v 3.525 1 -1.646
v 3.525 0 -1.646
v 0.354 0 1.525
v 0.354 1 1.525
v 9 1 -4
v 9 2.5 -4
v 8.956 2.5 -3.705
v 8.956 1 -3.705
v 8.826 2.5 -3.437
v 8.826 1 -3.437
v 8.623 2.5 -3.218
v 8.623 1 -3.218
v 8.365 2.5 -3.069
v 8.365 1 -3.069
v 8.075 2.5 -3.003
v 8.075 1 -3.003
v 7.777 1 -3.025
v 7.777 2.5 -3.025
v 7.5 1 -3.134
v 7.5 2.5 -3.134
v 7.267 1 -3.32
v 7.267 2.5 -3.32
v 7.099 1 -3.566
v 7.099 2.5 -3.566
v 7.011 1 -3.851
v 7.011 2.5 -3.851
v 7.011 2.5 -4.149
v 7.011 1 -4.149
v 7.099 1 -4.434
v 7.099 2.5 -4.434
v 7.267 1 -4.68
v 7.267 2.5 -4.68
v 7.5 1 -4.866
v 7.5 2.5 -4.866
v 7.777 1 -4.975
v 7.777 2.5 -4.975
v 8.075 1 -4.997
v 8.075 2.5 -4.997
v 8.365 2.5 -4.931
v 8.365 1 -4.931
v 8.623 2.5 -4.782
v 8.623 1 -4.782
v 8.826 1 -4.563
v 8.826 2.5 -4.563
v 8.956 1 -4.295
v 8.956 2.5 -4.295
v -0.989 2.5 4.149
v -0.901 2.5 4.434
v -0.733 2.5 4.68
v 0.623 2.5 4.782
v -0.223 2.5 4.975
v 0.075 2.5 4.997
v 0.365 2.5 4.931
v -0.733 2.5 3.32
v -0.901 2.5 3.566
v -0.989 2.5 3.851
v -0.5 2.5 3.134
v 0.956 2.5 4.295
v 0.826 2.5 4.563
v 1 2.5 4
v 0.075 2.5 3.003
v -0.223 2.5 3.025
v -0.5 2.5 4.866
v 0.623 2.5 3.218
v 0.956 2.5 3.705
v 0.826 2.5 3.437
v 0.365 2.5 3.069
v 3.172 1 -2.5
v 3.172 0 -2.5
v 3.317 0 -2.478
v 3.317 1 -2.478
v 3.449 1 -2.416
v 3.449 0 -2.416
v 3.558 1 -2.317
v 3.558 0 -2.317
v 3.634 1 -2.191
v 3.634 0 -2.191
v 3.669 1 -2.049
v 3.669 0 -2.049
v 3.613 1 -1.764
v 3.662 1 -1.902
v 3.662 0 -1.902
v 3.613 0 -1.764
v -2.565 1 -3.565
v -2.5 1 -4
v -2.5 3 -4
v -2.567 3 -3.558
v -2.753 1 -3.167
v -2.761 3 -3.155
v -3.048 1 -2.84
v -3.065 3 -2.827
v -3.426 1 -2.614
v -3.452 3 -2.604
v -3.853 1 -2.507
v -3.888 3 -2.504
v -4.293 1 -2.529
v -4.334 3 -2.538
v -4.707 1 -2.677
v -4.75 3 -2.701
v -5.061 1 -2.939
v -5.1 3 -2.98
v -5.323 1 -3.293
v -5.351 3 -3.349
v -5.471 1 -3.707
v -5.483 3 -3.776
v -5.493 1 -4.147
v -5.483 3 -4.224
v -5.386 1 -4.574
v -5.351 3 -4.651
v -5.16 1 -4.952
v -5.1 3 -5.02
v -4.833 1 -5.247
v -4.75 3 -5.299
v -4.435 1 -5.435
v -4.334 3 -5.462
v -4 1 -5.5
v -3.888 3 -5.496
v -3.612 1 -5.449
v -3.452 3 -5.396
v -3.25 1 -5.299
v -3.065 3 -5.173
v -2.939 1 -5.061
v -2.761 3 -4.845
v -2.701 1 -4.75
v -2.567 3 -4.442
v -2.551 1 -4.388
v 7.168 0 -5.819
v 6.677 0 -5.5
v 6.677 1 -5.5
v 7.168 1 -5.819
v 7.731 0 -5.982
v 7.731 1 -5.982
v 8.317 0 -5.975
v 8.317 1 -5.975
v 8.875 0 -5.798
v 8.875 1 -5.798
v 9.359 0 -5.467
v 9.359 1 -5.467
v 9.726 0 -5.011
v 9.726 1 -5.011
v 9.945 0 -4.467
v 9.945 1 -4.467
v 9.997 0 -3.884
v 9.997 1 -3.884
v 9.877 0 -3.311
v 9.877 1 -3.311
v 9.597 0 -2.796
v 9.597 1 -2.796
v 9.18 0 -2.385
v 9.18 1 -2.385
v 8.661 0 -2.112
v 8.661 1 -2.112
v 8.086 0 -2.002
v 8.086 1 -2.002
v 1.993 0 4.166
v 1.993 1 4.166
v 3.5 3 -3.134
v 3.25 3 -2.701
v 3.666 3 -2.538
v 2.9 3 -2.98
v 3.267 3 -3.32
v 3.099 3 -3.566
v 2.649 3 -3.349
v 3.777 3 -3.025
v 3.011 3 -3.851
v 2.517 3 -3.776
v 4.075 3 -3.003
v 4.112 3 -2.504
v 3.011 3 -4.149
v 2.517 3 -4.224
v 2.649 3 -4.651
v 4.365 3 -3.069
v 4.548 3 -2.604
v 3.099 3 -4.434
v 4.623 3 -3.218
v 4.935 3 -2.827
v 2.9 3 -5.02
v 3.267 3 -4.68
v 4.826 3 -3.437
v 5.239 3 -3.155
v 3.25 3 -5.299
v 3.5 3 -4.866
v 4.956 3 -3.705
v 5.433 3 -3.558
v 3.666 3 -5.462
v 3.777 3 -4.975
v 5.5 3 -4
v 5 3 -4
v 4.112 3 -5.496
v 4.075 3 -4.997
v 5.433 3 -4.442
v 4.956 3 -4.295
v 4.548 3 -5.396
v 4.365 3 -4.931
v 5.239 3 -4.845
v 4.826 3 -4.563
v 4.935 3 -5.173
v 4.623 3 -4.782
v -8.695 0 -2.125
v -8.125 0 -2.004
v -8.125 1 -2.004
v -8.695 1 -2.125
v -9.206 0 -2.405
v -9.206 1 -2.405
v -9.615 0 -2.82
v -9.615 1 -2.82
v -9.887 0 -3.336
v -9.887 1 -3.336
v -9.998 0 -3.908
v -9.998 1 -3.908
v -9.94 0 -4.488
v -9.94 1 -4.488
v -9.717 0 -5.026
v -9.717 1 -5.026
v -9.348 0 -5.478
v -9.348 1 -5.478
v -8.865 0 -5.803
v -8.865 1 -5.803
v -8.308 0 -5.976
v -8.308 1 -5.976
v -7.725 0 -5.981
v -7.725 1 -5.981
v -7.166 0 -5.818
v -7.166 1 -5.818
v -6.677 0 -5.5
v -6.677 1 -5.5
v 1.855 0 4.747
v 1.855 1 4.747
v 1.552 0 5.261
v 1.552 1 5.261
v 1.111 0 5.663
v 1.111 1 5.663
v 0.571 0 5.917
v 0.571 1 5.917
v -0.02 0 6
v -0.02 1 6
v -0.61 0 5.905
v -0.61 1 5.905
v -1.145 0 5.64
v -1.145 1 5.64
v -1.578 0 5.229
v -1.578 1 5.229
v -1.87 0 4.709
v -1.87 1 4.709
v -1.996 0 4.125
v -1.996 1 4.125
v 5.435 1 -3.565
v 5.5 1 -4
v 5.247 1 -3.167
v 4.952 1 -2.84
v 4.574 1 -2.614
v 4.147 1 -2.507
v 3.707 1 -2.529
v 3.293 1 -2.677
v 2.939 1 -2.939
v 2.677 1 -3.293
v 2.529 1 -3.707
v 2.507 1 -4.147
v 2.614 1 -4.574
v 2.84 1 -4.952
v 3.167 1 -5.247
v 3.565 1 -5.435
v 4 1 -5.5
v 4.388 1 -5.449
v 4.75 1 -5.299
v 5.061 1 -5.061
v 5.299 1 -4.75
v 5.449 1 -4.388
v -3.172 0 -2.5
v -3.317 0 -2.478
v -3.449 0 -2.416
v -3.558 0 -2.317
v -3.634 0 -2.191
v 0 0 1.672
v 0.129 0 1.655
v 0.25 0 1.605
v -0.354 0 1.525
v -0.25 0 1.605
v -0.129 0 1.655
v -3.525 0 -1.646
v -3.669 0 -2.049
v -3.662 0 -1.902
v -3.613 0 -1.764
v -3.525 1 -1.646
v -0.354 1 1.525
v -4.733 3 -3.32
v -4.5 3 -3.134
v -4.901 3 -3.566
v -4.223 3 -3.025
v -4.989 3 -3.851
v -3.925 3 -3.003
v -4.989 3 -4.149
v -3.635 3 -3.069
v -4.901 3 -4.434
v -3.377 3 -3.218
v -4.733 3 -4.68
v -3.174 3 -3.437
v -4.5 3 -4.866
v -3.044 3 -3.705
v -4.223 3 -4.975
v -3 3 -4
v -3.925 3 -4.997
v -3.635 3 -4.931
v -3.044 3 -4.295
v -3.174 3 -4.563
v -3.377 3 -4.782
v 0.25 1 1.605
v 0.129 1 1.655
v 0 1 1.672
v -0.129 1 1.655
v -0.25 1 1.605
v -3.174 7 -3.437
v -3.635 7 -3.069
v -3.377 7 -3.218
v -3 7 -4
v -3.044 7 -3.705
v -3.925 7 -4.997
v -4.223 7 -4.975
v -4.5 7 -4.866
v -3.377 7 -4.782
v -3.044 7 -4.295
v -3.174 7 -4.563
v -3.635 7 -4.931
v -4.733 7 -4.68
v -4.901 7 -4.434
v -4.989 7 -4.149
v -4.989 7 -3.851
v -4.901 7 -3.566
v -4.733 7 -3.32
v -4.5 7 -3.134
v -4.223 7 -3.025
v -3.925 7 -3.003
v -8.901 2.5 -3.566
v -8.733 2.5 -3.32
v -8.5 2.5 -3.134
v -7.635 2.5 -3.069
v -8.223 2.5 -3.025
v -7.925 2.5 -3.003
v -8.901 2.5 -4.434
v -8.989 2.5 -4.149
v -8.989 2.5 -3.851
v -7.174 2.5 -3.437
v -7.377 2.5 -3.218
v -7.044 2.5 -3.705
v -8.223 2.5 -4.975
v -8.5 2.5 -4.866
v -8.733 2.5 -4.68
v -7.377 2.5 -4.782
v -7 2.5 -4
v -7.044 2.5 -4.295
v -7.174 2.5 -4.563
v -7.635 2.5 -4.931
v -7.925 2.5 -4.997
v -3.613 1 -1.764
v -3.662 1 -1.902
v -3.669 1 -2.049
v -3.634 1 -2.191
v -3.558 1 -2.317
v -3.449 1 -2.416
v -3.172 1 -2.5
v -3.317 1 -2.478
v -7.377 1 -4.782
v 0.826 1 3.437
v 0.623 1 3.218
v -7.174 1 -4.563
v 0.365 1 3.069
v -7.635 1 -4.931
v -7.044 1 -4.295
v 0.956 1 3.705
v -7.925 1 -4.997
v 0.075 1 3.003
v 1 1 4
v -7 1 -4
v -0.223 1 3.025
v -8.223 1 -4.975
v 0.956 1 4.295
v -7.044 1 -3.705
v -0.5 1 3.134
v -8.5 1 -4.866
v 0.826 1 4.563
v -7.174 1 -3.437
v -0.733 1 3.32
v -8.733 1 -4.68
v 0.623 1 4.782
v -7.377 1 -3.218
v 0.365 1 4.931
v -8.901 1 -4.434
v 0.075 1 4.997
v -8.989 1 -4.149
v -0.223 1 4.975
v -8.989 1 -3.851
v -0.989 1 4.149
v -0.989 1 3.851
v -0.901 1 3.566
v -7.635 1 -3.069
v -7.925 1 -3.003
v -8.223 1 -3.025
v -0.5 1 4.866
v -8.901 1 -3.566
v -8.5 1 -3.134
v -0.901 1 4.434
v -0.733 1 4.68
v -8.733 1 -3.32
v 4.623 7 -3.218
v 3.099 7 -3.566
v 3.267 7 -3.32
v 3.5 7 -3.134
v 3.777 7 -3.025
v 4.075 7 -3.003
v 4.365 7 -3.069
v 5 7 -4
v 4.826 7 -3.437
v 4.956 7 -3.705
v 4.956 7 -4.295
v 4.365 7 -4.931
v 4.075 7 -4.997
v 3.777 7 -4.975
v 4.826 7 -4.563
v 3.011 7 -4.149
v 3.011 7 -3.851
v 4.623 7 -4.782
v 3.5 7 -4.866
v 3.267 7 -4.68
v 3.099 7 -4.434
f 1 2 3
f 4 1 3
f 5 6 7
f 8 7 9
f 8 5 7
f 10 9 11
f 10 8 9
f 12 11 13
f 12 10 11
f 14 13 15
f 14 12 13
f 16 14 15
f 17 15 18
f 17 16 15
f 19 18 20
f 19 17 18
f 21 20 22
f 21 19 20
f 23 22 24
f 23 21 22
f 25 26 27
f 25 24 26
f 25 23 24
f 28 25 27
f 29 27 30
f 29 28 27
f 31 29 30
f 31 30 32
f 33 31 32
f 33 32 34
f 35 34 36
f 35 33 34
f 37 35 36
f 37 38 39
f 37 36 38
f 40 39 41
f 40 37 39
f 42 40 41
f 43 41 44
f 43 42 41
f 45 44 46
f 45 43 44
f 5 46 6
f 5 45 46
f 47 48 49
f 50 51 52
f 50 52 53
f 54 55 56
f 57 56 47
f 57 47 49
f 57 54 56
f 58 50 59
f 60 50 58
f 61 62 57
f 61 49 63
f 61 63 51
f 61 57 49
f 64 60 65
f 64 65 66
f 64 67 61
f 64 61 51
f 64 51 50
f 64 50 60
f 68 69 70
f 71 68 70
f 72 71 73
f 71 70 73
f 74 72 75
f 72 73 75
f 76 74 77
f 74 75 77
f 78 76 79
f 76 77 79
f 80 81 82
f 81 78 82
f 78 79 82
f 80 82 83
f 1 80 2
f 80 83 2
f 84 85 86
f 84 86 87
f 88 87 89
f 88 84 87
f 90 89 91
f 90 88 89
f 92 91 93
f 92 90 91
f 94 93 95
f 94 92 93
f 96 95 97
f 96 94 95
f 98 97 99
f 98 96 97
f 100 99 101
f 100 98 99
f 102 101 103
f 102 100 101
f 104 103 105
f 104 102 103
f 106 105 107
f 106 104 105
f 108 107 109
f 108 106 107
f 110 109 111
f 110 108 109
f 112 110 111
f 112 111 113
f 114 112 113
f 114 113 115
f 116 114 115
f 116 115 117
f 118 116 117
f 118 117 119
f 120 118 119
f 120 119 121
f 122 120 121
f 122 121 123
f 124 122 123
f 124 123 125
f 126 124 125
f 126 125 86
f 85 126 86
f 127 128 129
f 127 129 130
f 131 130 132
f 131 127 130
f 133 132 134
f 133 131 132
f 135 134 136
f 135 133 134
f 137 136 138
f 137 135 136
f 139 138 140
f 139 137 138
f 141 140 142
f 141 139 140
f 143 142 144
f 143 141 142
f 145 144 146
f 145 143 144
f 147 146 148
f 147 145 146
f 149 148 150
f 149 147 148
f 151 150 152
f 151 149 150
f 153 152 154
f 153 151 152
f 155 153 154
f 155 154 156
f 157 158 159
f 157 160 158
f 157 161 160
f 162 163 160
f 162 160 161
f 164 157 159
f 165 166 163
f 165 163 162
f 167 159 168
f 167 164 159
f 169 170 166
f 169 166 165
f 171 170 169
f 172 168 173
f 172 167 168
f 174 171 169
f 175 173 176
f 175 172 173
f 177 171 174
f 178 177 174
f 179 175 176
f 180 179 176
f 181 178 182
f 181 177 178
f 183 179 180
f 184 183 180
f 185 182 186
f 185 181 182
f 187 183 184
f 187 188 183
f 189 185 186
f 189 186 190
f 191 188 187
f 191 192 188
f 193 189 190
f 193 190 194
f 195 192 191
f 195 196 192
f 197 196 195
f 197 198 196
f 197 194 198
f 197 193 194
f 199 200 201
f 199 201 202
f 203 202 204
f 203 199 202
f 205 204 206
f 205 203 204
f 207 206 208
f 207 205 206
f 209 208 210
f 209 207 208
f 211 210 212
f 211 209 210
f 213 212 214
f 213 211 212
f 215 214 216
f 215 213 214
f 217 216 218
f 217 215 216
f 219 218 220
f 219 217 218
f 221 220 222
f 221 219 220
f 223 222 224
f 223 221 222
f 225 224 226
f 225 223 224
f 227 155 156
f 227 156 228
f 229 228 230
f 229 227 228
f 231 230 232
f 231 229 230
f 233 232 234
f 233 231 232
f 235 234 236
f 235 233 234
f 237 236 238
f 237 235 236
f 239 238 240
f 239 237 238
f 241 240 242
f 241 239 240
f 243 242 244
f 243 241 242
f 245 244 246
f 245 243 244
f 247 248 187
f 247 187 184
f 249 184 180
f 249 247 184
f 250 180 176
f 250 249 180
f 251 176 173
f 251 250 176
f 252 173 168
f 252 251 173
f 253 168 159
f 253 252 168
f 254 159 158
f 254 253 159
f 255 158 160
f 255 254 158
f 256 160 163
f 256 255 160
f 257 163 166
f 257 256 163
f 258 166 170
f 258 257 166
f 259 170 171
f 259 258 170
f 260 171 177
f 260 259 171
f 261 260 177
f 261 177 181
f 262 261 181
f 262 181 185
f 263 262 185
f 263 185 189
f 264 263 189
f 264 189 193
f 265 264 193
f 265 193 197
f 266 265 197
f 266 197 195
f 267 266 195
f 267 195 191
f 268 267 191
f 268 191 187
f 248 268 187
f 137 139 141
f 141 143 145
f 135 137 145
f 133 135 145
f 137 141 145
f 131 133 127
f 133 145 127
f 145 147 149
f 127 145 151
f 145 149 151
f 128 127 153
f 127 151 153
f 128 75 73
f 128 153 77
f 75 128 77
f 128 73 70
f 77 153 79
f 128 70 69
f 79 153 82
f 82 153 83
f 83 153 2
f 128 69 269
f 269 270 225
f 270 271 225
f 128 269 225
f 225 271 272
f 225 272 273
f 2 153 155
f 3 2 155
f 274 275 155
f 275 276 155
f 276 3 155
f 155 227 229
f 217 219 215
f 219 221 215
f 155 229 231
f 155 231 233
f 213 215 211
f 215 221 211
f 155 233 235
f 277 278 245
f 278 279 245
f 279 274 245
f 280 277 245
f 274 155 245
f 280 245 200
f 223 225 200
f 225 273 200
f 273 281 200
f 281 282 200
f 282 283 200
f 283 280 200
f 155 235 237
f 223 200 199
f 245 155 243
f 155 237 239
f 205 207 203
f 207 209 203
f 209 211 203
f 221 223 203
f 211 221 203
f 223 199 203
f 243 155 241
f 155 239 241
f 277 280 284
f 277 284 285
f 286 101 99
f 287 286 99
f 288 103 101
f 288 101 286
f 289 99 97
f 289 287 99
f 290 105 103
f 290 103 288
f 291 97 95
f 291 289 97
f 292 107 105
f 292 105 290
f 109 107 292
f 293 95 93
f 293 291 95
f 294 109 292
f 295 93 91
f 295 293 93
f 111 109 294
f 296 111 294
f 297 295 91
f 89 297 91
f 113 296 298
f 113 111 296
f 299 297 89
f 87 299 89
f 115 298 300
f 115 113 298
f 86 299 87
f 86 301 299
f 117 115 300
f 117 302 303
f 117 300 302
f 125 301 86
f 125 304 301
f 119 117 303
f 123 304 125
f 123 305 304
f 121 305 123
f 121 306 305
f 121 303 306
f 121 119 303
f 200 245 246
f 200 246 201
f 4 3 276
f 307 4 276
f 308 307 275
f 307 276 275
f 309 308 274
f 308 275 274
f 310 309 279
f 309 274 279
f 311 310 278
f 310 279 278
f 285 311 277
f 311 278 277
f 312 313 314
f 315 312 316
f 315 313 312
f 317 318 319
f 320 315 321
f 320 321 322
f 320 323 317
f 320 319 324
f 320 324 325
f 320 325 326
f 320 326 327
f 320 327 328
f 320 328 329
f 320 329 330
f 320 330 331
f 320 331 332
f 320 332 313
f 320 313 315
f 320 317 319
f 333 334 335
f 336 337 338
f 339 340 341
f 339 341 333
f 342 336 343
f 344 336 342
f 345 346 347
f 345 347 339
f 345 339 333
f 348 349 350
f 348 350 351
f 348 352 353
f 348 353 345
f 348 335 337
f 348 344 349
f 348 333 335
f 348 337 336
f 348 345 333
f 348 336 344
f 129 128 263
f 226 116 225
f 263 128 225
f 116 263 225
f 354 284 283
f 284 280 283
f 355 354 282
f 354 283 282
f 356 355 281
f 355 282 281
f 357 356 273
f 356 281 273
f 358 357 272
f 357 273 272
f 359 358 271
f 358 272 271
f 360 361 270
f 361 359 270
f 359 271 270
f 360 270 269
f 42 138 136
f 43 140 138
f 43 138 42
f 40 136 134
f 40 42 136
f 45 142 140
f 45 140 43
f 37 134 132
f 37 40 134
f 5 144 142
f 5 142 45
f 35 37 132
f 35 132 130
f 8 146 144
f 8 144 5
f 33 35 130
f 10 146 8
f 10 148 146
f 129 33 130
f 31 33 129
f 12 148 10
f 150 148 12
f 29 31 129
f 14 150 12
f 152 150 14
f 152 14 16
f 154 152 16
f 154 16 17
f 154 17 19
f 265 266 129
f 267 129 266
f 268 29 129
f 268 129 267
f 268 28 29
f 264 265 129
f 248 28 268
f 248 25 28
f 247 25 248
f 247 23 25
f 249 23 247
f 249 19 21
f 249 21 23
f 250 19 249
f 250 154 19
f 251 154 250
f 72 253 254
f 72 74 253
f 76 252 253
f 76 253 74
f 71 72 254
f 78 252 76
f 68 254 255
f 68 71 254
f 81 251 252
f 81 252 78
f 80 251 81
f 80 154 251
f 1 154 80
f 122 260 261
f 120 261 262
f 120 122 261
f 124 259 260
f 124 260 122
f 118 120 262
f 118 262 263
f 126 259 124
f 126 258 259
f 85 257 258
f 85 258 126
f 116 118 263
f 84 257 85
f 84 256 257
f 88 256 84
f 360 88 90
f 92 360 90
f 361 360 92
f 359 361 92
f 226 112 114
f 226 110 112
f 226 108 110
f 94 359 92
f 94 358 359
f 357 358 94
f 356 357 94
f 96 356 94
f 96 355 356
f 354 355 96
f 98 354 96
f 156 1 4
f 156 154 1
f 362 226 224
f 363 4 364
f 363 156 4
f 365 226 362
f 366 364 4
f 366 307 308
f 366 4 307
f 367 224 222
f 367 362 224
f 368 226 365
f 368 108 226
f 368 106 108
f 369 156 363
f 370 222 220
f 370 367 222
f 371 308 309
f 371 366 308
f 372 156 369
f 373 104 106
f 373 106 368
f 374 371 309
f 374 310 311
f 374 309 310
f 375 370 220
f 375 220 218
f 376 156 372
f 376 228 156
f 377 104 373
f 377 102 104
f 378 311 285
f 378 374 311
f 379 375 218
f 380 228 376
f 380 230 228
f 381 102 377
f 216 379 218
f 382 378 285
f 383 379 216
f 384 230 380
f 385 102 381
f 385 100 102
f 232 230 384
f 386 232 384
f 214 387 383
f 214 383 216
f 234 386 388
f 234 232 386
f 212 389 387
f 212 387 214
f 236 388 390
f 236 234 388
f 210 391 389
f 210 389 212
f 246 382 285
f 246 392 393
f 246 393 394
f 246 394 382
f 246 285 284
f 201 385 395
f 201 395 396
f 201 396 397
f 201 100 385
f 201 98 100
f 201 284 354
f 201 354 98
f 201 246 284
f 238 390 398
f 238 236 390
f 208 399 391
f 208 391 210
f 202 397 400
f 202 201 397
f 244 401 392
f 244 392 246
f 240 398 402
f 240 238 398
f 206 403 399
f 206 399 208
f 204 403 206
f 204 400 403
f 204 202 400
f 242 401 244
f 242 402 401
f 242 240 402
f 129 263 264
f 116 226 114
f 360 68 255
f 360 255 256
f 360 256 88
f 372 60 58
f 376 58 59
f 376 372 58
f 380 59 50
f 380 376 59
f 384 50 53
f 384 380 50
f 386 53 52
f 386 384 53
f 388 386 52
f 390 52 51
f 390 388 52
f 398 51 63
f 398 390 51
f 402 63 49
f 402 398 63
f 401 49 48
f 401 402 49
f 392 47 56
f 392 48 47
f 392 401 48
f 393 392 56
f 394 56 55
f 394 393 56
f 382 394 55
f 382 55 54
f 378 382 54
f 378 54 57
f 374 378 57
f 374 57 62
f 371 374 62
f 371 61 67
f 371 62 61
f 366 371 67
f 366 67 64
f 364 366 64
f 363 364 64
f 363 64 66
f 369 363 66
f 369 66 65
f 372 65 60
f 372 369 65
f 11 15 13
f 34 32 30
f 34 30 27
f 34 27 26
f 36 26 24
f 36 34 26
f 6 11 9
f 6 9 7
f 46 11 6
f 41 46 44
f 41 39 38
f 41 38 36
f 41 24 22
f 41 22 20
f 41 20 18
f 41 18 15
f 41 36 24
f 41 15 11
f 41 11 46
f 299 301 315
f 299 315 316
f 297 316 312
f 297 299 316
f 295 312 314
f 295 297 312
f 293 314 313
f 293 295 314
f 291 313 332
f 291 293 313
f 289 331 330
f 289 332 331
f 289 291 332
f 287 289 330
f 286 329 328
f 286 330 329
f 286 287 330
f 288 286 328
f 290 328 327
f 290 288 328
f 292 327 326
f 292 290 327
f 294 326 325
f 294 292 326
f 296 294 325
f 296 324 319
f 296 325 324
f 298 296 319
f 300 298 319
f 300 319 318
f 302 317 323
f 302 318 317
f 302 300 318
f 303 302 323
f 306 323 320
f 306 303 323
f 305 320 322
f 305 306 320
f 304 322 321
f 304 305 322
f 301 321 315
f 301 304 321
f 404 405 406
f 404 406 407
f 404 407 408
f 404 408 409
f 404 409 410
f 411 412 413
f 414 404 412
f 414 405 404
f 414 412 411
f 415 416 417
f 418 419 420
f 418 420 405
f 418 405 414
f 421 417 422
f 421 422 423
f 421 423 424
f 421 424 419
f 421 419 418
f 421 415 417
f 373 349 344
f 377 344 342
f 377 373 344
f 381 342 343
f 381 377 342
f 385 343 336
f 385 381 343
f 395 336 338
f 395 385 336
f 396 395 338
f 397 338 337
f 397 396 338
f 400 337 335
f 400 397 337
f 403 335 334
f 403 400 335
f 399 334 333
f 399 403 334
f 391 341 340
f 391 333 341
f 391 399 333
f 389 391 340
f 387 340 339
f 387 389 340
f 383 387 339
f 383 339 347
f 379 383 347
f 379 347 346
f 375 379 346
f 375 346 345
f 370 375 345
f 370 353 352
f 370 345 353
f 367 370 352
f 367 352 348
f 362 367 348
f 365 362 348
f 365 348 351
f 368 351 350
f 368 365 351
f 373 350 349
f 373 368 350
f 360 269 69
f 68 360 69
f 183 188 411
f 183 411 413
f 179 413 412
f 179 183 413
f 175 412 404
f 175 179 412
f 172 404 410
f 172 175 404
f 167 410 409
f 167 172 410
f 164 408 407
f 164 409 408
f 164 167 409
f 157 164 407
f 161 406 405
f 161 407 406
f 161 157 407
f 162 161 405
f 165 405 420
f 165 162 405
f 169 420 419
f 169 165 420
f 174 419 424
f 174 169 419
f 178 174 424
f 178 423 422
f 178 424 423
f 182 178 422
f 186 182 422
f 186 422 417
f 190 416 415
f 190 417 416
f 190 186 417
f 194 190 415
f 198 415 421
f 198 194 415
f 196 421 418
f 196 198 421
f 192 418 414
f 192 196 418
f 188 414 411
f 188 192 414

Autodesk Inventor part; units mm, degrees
ref_plane "YZ Plane" through (0, 0, 0) normal (1, 0, 0) x (0, 1, 0)
ref_plane "XZ Plane" through (0, 0, 0) normal (0, 1, 0) x (-1, 0, 0)
ref_plane "XY Plane" through (0, 0, 0) normal (0, 0, 1) x (1, 0, 0)
sketch "Sketch1" plane through (0, 0, 0) normal (0, 1, 0) x (-1, 0, 0)
  line L0 (-8, -4) -> (8, -4)
  line L1 (8, -4) -> (8, 4)
  line L2 (8, 4) -> (-8, 4)
  line L3 (-8, 4) -> (-8, -4)
  line L4 (-8, -4) -> (8, 4) construction
  line L5 (8, -4) -> (-8, 4) construction
  circle A0 centre (8, -4) radius 1
  circle A1 centre (8, -4) radius 2
  circle A2 centre (0, 4) radius 1
  circle A3 centre (-8, -4) radius 1
  circle A4 centre (-8, -4) radius 2
  circle A5 centre (0, 4) radius 2
  line L6 (8, -4) -> (0, 4)
  line L7 (0, 4) -> (-8, -4)
  line L8 (0, -4) -> (0, -5.5)
  line L9 (-6.6771, -5.5) -> (6.6771, -5.5)
  line L10 (4, 0) -> (5.0607, 1.0607)
  line L11 (-4, 0) -> (-5.0607, 1.0607)
  line L12 (0.1252, 5.9961) -> (9.9961, -3.8748)
  line L13 (-8.1282, -2.0445) -> (-1.9931, 4.1658)
  line L14 (-3.5251, -1.6464) -> (-0.3536, 1.5251)
  line L15 (3.5251, -1.6464) -> (0.3536, 1.5251)
  arc A6 (0.3536, 1.5251) -> (-0.3536, 1.5251) centre (0, 1.1716) ccw
  line L16 (3.1716, -2.5) -> (-3.1716, -2.5)
  arc A7 (-3.5251, -1.6464) -> (-3.1716, -2.5) centre (-3.1716, -2) ccw
  arc A8 (3.1716, -2.5) -> (3.5251, -1.6464) centre (3.1716, -2) ccw
  point P0 (0, 0)
  point P1 (0.1252, 5.9961)
  point P2 (-8.0861, -2.0019)
  point P3 (-6.6771, -5.5)
  point P4 (0.1252, 2.0039)
  point P5 (-0.1252, 2.0039)
  point P6 (1.9961, 4.1252)
  point P7 (8.1252, -2.0039)
  dimension "d0" = 16
  dimension "d1" = 8
  dimension "d2" = 2
  dimension "d3" = 4
  dimension "d4" = 2
  dimension "d5" = 2
  dimension "d6" = 4
  dimension "d7" = 4
  dimension "d8" = 1.5
  dimension "d9" = 1.5
  dimension "d10" = 1.5
  dimension "d23" = 90
  dimension "d28" = 90
  dimension "d29" = 0.5
  dimension "d31" = 0.5
  dimension "d32" = 1.5
  dimension "d33" = 1.5
  dimension "d34" = 1.5
  dimension "d35" = 90
extrude "Extrusion1" add sketch "Sketch1" along normal blind 1 contours A3 L7 A4 L0 | L0 A4 L3 A3 | L3 A4 L7 A3 | A4 L7 A5 L6 A1 L0 | L0 L8 L9 A4 | A4 L13 L3 | L3 L13 L11 L7 A4 | L0 A1 L9 L8 | L11 L13 L2 A5 L7 | A1 L6 A0 L0 | L0 A0 L1 A1 L12 | L7 A2 L6 A5 | A5 L2 A2 L7 | L6 L10 L12 L1 A1 | A1 L1 A0 L6 | L13 A5 L2 | A5 L12 L2 A2 | L6 A2 L2 A5 | A5 L2 L12 L10 L6 | L1 L12 A1 | A5 L12 L2 | A1 L12 | A5 L12
sketch "Sketch2" plane through (0, 1, 0) normal (0, 1, 0) x (1, 0, 0)
  line L0 (-8.1252, 2.0039) -> (-1.9961, -4.1252) projected
  arc A0 (-1.9961, -4.1252) -> (1.9931, -4.1658) centre (0, -4) ccw projected
  line L1 (1.9931, -4.1658) -> (8.0861, 2.0019) projected
  arc A1 (8.0861, 2.0019) -> (6.6771, 5.5) centre (8, 4) ccw projected
  line L2 (6.6771, 5.5) -> (-6.6771, 5.5) projected
  arc A2 (-6.6771, 5.5) -> (-8.1252, 2.0039) centre (-8, 4) ccw projected
  circle A3 centre (-8, 4) radius 1 projected
  circle A4 centre (0, -4) radius 1 projected
  circle A5 centre (8, 4) radius 1 projected
  point P0 (0, 0)
extrude "Extrusion2" add sketch "Sketch2" along normal blind 1.5 and the other way blind 1 contours A3 | A5
sketch "Sketch4" plane through (0, 1, 0) normal (0, 1, 0) x (1, 0, 0)
  line L0 (-8.1252, 2.0039) -> (-1.9961, -4.1252) projected
  arc A0 (-1.9961, -4.1252) -> (1.9931, -4.1658) centre (0, -4) ccw projected
  line L1 (1.9931, -4.1658) -> (8.0861, 2.0019) projected
  arc A1 (8.0861, 2.0019) -> (6.6771, 5.5) centre (8, 4) ccw projected
  line L2 (6.6771, 5.5) -> (-6.6771, 5.5) projected
  arc A2 (-6.6771, 5.5) -> (-8.1252, 2.0039) centre (-8, 4) ccw projected
  circle A3 centre (-8, 4) radius 1 projected
  circle A4 centre (8, 4) radius 1 projected
  circle A5 centre (0, -4) radius 1 projected
  line L3 (-3.1716, 2.5) -> (3.1716, 2.5) projected
  arc A6 (3.5251, 1.6464) -> (3.1716, 2.5) centre (3.1716, 2) ccw projected
  line L4 (3.5251, 1.6464) -> (0.3536, -1.5251) projected
  arc A7 (-0.3536, -1.5251) -> (0.3536, -1.5251) centre (0, -1.1716) ccw projected
  line L5 (-0.3536, -1.5251) -> (-3.5251, 1.6464) projected
  arc A8 (-3.1716, 2.5) -> (-3.5251, 1.6464) centre (-3.1716, 2) ccw projected
  point P0 (0, 0)
extrude "Extrusion4" add sketch "Sketch4" along normal blind 1.5 and the other way blind 1 contours A5
sketch "Sketch5" plane through (0, 1, 0) normal (0, 1, 0) x (1, 0, 0)
  line L0 (-8.1252, 2.0039) -> (-1.9961, -4.1252) projected
  arc A0 (-1.9961, -4.1252) -> (1.9931, -4.1658) centre (0, -4) ccw projected
  line L1 (1.9931, -4.1658) -> (8.0861, 2.0019) projected
  arc A1 (8.0861, 2.0019) -> (6.6771, 5.5) centre (8, 4) ccw projected
  line L2 (6.6771, 5.5) -> (-6.6771, 5.5) projected
  arc A2 (-6.6771, 5.5) -> (-8.1252, 2.0039) centre (-8, 4) ccw projected
  circle A3 centre (-8, 4) radius 1 projected
  circle A4 centre (8, 4) radius 1 projected
  circle A5 centre (0, -4) radius 1 projected
  line L3 (-3.1716, 2.5) -> (3.1716, 2.5) projected
  arc A6 (3.5251, 1.6464) -> (3.1716, 2.5) centre (3.1716, 2) ccw projected
  line L4 (3.5251, 1.6464) -> (0.3536, -1.5251) projected
  arc A7 (-0.3536, -1.5251) -> (0.3536, -1.5251) centre (0, -1.1716) ccw projected
  line L5 (-0.3536, -1.5251) -> (-3.5251, 1.6464) projected
  arc A8 (-3.1716, 2.5) -> (-3.5251, 1.6464) centre (-3.1716, 2) ccw projected
  circle A9 centre (-4, 4) radius 1.5
  circle A10 centre (4, 4) radius 1.5
  point P0 (0, 0)
  dimension "d40" = 3
  dimension "d42" = 4
  dimension "d43" = 4
  dimension "d44" = 1.5
  dimension "d45" = 1.5
extrude "Extrusion5" add sketch "Sketch5" along normal blind 2 contours A10 | A9
sketch "Sketch6" plane through (-4, 3, -4) normal (0, 1, 0) x (1, 0, 0)
  circle A0 centre (0, 0) radius 1.5 projected
  circle A1 centre (8, 0) radius 1.5 projected
  circle A2 centre (0, 0) radius 1
  circle A3 centre (8, 0) radius 1
  point P0 (4, -4)
  dimension "d48" = 2
  dimension "d49" = 2
extrude "Extrusion6" add sketch "Sketch6" along normal blind 4 contours A2 | A3
equation "\"d2\" = d4"
equation "\"d3\" = d7"
equation "\"d5\" = d4"
equation "\"d6\" = d7"
equation "\"d45\" = d44"
equation "\"d49\" = d48"
properties part number "bar"
